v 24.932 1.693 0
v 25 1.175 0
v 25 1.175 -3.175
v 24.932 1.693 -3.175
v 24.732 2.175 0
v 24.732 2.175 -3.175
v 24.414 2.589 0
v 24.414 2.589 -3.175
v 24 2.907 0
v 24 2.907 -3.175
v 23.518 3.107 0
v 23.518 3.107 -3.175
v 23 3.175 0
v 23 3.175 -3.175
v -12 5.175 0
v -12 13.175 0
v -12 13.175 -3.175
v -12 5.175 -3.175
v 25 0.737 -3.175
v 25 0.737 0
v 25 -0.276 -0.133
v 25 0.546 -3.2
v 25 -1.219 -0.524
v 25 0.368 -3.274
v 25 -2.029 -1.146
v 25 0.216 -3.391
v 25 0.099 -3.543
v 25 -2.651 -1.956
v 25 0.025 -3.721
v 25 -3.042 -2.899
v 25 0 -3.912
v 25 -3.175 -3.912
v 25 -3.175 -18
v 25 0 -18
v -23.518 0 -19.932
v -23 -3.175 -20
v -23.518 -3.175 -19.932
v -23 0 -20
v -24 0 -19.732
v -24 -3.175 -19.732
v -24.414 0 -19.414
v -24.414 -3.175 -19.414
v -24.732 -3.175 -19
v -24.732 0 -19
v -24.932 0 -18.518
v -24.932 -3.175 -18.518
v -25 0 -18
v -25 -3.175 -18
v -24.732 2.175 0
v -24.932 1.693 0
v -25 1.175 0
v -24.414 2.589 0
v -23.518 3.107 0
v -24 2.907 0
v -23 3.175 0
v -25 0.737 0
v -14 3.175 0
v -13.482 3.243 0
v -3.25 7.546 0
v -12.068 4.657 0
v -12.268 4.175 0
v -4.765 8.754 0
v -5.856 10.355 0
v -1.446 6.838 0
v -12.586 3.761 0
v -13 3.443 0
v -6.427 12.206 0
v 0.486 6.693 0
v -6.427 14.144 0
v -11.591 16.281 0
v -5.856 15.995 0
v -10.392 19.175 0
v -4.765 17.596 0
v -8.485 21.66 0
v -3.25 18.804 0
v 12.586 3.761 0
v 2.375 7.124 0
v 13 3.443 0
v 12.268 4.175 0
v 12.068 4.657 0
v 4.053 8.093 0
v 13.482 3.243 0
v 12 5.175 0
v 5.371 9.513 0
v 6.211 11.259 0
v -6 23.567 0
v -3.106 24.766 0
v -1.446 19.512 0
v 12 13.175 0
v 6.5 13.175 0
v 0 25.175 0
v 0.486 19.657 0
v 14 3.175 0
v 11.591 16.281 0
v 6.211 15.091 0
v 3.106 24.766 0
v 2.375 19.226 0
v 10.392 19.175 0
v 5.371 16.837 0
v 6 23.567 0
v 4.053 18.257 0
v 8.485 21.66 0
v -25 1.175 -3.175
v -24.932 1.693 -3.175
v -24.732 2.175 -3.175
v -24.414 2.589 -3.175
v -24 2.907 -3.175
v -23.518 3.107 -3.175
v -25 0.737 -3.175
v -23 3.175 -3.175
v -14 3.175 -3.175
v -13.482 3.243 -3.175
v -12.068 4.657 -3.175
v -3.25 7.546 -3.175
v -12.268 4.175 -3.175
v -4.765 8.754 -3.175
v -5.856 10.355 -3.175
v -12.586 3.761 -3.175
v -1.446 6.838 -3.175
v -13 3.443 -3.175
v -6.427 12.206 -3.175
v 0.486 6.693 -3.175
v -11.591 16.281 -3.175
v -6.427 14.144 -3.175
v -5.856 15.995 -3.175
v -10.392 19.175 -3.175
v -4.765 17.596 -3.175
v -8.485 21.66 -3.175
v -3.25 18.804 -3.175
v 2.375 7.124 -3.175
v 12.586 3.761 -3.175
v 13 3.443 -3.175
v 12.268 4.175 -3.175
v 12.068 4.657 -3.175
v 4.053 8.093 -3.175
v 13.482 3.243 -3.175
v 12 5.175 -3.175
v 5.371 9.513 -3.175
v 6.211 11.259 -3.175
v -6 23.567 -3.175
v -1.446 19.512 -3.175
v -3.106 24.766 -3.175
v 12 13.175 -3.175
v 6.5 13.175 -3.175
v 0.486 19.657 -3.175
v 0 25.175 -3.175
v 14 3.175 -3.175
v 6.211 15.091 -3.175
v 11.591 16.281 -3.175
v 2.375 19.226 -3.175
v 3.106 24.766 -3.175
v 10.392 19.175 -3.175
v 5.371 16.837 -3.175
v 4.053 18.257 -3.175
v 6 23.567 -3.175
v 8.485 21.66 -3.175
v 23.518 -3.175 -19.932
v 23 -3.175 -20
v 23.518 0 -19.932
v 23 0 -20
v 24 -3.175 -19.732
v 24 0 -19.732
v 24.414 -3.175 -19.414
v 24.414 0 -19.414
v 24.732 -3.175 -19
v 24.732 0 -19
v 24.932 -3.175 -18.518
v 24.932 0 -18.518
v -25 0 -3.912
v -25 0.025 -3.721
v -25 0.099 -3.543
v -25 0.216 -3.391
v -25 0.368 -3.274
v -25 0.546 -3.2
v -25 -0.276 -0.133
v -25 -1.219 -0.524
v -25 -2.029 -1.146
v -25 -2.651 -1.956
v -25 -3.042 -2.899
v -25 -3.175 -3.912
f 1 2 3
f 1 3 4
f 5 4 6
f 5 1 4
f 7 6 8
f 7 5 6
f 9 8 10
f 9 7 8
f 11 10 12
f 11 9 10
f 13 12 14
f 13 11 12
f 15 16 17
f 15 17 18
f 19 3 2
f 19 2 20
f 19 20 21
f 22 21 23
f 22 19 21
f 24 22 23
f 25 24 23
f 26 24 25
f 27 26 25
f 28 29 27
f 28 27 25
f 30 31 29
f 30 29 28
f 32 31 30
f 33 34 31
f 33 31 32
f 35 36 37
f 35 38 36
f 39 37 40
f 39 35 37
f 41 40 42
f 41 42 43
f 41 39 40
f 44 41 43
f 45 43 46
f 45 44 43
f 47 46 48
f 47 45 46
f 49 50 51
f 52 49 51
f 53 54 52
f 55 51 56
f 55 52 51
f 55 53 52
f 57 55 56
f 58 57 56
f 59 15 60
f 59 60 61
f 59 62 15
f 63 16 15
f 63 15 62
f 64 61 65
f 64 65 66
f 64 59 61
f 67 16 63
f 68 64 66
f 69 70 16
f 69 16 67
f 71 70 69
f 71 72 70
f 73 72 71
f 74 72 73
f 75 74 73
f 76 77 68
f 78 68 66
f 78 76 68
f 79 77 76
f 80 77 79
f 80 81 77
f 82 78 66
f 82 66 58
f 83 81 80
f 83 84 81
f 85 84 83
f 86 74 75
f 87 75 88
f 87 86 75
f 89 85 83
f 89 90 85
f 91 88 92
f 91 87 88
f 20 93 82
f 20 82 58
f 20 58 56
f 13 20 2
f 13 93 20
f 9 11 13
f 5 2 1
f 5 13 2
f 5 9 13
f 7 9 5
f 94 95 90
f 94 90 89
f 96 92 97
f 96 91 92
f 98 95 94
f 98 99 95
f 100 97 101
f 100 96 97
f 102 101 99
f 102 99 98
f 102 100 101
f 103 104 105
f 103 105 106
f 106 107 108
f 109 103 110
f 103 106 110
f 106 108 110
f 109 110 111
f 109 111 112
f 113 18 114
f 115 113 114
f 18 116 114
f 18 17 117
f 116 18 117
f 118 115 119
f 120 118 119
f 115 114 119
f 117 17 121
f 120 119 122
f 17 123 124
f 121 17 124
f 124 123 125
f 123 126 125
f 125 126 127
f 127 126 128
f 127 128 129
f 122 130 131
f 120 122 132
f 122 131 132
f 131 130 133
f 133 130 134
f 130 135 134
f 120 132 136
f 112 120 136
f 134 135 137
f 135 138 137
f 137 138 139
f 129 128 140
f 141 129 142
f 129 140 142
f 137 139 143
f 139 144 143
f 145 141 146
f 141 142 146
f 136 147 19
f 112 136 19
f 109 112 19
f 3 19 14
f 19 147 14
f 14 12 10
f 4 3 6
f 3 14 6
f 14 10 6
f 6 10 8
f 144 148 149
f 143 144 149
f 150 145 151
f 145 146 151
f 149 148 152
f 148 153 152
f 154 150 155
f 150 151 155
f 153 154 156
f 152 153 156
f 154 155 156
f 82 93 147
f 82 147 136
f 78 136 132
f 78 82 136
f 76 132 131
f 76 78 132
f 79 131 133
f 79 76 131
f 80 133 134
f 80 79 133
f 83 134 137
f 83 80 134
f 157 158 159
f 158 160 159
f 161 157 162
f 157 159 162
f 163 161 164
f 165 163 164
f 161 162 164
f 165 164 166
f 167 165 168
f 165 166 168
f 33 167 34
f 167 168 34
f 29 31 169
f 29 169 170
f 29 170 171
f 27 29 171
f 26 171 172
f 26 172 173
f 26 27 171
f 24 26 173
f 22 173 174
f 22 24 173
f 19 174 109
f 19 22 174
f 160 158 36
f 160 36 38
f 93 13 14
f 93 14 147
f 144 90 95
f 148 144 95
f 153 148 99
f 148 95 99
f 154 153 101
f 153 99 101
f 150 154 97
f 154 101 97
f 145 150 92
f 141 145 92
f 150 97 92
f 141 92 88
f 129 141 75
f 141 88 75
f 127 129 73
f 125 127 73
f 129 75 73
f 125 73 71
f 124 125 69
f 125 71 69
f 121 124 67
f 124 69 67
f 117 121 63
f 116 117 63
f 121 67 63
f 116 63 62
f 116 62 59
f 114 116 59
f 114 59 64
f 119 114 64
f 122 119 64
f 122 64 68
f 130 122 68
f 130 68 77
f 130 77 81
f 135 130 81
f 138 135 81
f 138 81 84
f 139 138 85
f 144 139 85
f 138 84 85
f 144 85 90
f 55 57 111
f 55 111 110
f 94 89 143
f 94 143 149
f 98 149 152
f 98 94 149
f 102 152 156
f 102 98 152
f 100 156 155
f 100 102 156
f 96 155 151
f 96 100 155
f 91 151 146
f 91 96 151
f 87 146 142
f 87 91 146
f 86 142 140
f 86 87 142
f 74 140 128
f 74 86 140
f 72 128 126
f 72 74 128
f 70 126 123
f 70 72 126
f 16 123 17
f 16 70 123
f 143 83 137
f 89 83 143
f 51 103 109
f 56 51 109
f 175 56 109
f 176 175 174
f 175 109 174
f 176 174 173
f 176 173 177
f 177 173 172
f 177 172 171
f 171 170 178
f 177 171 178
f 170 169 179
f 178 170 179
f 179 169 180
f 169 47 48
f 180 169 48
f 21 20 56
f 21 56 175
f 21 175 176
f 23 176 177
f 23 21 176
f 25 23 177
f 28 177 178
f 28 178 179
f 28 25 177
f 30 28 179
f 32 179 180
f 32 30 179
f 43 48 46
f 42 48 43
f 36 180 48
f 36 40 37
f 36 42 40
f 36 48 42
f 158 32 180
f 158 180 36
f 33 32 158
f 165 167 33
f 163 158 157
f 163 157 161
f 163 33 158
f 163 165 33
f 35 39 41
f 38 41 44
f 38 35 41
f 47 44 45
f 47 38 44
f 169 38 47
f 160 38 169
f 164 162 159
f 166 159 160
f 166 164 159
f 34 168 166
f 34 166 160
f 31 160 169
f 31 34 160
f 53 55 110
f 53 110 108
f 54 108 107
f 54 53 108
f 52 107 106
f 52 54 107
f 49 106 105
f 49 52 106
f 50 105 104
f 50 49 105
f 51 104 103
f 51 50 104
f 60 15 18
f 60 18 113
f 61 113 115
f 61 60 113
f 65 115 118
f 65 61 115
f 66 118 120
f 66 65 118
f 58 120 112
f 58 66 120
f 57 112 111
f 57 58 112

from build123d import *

# Parameters (mm, degrees)
SKETCH1_R                    = 6.5
BASE_FLANGE1_DEPTH           = 3.175
EDGE_FLANGE1_STRIP_W         = 14.1732
EDGE_FLANGE1_STRIP_H         = 3.175
EDGE_FLANGE1_STRIP_CUT_DEPTH = 50
EDGE_FLANGE1_DEPTH           = 50
FILLET2_R                    = 2


# Sheet-metal steps are written as plain solids
with BuildPart() as part:
    # Sketch1 → Base-Flange1 (new body)
    with BuildSketch(Plane.XY):
        with BuildLine():
            Line((-25, 0), (25, 0))
            Line((25, 0), (25, 1.175))
            ThreePointArc((25, 1.175), (24.414213562, 2.589213562), (23, 3.175))
            Line((23, 3.175), (14, 3.175))
            ThreePointArc((14, 3.175), (12.585786438, 3.760786438), (12, 5.175))
            Line((12, 5.175), (12, 13.175))
            ThreePointArc((12, 13.175), (0, 25.175), (-12, 13.175))
            Line((-12, 13.175), (-12, 5.175))
            ThreePointArc((-12, 5.175), (-12.585786438, 3.760786438), (-14, 3.175))
            Line((-14, 3.175), (-23, 3.175))
            ThreePointArc((-23, 3.175), (-24.414213562, 2.589213562), (-25, 1.175))
            Line((-25, 1.175), (-25, 0))
        make_face()
        with Locations((0, 13.175)):
            Circle(SKETCH1_R, mode=Mode.SUBTRACT)
    extrude(amount=-BASE_FLANGE1_DEPTH)

    # Edge-Flange1 strip (across the edge) → Edge-Flange1 strip cut (cut)
    with BuildSketch(Plane(origin=(25, 0, -3.175), x_dir=(0, 1, 0), z_dir=(-1, 0, 0))):
        with Locations((-6.35, -1.5875)):
            Rectangle(EDGE_FLANGE1_STRIP_W, EDGE_FLANGE1_STRIP_H)
    extrude(amount=EDGE_FLANGE1_STRIP_CUT_DEPTH, mode=Mode.SUBTRACT)

    # Edge-Flange1 section (across the edge) → Edge-Flange1 (add)
    with BuildSketch(Plane(origin=(25, 0, -3.175), x_dir=(0, 1, 0), z_dir=(-1, 0, 0))):
        with BuildLine():
            Line((-3.175, 0.7366), (-3.175, 16.825))
            Line((-3.175, 16.825), (0, 16.825))
            Line((0, 16.825), (0, 0.7366))
            ThreePointArc((0, 0.7366), (0.215745145, 0.215745145), (0.7366, 0))
            Line((0.7366, 0), (0.7366, -3.175))
            ThreePointArc((0.7366, -3.175), (-2.029318885, -2.029318885), (-3.175, 0.7366))
        make_face()
    extrude(amount=EDGE_FLANGE1_DEPTH)

    # Fillet2
    fillet2_edges = [part.edges().sort_by_distance(p)[0] for p in [
        (25, -1.5875, -20),
        (-25, -1.5875, -20),
    ]]
    fillet(fillet2_edges, radius=FILLET2_R)


solid = part.part
